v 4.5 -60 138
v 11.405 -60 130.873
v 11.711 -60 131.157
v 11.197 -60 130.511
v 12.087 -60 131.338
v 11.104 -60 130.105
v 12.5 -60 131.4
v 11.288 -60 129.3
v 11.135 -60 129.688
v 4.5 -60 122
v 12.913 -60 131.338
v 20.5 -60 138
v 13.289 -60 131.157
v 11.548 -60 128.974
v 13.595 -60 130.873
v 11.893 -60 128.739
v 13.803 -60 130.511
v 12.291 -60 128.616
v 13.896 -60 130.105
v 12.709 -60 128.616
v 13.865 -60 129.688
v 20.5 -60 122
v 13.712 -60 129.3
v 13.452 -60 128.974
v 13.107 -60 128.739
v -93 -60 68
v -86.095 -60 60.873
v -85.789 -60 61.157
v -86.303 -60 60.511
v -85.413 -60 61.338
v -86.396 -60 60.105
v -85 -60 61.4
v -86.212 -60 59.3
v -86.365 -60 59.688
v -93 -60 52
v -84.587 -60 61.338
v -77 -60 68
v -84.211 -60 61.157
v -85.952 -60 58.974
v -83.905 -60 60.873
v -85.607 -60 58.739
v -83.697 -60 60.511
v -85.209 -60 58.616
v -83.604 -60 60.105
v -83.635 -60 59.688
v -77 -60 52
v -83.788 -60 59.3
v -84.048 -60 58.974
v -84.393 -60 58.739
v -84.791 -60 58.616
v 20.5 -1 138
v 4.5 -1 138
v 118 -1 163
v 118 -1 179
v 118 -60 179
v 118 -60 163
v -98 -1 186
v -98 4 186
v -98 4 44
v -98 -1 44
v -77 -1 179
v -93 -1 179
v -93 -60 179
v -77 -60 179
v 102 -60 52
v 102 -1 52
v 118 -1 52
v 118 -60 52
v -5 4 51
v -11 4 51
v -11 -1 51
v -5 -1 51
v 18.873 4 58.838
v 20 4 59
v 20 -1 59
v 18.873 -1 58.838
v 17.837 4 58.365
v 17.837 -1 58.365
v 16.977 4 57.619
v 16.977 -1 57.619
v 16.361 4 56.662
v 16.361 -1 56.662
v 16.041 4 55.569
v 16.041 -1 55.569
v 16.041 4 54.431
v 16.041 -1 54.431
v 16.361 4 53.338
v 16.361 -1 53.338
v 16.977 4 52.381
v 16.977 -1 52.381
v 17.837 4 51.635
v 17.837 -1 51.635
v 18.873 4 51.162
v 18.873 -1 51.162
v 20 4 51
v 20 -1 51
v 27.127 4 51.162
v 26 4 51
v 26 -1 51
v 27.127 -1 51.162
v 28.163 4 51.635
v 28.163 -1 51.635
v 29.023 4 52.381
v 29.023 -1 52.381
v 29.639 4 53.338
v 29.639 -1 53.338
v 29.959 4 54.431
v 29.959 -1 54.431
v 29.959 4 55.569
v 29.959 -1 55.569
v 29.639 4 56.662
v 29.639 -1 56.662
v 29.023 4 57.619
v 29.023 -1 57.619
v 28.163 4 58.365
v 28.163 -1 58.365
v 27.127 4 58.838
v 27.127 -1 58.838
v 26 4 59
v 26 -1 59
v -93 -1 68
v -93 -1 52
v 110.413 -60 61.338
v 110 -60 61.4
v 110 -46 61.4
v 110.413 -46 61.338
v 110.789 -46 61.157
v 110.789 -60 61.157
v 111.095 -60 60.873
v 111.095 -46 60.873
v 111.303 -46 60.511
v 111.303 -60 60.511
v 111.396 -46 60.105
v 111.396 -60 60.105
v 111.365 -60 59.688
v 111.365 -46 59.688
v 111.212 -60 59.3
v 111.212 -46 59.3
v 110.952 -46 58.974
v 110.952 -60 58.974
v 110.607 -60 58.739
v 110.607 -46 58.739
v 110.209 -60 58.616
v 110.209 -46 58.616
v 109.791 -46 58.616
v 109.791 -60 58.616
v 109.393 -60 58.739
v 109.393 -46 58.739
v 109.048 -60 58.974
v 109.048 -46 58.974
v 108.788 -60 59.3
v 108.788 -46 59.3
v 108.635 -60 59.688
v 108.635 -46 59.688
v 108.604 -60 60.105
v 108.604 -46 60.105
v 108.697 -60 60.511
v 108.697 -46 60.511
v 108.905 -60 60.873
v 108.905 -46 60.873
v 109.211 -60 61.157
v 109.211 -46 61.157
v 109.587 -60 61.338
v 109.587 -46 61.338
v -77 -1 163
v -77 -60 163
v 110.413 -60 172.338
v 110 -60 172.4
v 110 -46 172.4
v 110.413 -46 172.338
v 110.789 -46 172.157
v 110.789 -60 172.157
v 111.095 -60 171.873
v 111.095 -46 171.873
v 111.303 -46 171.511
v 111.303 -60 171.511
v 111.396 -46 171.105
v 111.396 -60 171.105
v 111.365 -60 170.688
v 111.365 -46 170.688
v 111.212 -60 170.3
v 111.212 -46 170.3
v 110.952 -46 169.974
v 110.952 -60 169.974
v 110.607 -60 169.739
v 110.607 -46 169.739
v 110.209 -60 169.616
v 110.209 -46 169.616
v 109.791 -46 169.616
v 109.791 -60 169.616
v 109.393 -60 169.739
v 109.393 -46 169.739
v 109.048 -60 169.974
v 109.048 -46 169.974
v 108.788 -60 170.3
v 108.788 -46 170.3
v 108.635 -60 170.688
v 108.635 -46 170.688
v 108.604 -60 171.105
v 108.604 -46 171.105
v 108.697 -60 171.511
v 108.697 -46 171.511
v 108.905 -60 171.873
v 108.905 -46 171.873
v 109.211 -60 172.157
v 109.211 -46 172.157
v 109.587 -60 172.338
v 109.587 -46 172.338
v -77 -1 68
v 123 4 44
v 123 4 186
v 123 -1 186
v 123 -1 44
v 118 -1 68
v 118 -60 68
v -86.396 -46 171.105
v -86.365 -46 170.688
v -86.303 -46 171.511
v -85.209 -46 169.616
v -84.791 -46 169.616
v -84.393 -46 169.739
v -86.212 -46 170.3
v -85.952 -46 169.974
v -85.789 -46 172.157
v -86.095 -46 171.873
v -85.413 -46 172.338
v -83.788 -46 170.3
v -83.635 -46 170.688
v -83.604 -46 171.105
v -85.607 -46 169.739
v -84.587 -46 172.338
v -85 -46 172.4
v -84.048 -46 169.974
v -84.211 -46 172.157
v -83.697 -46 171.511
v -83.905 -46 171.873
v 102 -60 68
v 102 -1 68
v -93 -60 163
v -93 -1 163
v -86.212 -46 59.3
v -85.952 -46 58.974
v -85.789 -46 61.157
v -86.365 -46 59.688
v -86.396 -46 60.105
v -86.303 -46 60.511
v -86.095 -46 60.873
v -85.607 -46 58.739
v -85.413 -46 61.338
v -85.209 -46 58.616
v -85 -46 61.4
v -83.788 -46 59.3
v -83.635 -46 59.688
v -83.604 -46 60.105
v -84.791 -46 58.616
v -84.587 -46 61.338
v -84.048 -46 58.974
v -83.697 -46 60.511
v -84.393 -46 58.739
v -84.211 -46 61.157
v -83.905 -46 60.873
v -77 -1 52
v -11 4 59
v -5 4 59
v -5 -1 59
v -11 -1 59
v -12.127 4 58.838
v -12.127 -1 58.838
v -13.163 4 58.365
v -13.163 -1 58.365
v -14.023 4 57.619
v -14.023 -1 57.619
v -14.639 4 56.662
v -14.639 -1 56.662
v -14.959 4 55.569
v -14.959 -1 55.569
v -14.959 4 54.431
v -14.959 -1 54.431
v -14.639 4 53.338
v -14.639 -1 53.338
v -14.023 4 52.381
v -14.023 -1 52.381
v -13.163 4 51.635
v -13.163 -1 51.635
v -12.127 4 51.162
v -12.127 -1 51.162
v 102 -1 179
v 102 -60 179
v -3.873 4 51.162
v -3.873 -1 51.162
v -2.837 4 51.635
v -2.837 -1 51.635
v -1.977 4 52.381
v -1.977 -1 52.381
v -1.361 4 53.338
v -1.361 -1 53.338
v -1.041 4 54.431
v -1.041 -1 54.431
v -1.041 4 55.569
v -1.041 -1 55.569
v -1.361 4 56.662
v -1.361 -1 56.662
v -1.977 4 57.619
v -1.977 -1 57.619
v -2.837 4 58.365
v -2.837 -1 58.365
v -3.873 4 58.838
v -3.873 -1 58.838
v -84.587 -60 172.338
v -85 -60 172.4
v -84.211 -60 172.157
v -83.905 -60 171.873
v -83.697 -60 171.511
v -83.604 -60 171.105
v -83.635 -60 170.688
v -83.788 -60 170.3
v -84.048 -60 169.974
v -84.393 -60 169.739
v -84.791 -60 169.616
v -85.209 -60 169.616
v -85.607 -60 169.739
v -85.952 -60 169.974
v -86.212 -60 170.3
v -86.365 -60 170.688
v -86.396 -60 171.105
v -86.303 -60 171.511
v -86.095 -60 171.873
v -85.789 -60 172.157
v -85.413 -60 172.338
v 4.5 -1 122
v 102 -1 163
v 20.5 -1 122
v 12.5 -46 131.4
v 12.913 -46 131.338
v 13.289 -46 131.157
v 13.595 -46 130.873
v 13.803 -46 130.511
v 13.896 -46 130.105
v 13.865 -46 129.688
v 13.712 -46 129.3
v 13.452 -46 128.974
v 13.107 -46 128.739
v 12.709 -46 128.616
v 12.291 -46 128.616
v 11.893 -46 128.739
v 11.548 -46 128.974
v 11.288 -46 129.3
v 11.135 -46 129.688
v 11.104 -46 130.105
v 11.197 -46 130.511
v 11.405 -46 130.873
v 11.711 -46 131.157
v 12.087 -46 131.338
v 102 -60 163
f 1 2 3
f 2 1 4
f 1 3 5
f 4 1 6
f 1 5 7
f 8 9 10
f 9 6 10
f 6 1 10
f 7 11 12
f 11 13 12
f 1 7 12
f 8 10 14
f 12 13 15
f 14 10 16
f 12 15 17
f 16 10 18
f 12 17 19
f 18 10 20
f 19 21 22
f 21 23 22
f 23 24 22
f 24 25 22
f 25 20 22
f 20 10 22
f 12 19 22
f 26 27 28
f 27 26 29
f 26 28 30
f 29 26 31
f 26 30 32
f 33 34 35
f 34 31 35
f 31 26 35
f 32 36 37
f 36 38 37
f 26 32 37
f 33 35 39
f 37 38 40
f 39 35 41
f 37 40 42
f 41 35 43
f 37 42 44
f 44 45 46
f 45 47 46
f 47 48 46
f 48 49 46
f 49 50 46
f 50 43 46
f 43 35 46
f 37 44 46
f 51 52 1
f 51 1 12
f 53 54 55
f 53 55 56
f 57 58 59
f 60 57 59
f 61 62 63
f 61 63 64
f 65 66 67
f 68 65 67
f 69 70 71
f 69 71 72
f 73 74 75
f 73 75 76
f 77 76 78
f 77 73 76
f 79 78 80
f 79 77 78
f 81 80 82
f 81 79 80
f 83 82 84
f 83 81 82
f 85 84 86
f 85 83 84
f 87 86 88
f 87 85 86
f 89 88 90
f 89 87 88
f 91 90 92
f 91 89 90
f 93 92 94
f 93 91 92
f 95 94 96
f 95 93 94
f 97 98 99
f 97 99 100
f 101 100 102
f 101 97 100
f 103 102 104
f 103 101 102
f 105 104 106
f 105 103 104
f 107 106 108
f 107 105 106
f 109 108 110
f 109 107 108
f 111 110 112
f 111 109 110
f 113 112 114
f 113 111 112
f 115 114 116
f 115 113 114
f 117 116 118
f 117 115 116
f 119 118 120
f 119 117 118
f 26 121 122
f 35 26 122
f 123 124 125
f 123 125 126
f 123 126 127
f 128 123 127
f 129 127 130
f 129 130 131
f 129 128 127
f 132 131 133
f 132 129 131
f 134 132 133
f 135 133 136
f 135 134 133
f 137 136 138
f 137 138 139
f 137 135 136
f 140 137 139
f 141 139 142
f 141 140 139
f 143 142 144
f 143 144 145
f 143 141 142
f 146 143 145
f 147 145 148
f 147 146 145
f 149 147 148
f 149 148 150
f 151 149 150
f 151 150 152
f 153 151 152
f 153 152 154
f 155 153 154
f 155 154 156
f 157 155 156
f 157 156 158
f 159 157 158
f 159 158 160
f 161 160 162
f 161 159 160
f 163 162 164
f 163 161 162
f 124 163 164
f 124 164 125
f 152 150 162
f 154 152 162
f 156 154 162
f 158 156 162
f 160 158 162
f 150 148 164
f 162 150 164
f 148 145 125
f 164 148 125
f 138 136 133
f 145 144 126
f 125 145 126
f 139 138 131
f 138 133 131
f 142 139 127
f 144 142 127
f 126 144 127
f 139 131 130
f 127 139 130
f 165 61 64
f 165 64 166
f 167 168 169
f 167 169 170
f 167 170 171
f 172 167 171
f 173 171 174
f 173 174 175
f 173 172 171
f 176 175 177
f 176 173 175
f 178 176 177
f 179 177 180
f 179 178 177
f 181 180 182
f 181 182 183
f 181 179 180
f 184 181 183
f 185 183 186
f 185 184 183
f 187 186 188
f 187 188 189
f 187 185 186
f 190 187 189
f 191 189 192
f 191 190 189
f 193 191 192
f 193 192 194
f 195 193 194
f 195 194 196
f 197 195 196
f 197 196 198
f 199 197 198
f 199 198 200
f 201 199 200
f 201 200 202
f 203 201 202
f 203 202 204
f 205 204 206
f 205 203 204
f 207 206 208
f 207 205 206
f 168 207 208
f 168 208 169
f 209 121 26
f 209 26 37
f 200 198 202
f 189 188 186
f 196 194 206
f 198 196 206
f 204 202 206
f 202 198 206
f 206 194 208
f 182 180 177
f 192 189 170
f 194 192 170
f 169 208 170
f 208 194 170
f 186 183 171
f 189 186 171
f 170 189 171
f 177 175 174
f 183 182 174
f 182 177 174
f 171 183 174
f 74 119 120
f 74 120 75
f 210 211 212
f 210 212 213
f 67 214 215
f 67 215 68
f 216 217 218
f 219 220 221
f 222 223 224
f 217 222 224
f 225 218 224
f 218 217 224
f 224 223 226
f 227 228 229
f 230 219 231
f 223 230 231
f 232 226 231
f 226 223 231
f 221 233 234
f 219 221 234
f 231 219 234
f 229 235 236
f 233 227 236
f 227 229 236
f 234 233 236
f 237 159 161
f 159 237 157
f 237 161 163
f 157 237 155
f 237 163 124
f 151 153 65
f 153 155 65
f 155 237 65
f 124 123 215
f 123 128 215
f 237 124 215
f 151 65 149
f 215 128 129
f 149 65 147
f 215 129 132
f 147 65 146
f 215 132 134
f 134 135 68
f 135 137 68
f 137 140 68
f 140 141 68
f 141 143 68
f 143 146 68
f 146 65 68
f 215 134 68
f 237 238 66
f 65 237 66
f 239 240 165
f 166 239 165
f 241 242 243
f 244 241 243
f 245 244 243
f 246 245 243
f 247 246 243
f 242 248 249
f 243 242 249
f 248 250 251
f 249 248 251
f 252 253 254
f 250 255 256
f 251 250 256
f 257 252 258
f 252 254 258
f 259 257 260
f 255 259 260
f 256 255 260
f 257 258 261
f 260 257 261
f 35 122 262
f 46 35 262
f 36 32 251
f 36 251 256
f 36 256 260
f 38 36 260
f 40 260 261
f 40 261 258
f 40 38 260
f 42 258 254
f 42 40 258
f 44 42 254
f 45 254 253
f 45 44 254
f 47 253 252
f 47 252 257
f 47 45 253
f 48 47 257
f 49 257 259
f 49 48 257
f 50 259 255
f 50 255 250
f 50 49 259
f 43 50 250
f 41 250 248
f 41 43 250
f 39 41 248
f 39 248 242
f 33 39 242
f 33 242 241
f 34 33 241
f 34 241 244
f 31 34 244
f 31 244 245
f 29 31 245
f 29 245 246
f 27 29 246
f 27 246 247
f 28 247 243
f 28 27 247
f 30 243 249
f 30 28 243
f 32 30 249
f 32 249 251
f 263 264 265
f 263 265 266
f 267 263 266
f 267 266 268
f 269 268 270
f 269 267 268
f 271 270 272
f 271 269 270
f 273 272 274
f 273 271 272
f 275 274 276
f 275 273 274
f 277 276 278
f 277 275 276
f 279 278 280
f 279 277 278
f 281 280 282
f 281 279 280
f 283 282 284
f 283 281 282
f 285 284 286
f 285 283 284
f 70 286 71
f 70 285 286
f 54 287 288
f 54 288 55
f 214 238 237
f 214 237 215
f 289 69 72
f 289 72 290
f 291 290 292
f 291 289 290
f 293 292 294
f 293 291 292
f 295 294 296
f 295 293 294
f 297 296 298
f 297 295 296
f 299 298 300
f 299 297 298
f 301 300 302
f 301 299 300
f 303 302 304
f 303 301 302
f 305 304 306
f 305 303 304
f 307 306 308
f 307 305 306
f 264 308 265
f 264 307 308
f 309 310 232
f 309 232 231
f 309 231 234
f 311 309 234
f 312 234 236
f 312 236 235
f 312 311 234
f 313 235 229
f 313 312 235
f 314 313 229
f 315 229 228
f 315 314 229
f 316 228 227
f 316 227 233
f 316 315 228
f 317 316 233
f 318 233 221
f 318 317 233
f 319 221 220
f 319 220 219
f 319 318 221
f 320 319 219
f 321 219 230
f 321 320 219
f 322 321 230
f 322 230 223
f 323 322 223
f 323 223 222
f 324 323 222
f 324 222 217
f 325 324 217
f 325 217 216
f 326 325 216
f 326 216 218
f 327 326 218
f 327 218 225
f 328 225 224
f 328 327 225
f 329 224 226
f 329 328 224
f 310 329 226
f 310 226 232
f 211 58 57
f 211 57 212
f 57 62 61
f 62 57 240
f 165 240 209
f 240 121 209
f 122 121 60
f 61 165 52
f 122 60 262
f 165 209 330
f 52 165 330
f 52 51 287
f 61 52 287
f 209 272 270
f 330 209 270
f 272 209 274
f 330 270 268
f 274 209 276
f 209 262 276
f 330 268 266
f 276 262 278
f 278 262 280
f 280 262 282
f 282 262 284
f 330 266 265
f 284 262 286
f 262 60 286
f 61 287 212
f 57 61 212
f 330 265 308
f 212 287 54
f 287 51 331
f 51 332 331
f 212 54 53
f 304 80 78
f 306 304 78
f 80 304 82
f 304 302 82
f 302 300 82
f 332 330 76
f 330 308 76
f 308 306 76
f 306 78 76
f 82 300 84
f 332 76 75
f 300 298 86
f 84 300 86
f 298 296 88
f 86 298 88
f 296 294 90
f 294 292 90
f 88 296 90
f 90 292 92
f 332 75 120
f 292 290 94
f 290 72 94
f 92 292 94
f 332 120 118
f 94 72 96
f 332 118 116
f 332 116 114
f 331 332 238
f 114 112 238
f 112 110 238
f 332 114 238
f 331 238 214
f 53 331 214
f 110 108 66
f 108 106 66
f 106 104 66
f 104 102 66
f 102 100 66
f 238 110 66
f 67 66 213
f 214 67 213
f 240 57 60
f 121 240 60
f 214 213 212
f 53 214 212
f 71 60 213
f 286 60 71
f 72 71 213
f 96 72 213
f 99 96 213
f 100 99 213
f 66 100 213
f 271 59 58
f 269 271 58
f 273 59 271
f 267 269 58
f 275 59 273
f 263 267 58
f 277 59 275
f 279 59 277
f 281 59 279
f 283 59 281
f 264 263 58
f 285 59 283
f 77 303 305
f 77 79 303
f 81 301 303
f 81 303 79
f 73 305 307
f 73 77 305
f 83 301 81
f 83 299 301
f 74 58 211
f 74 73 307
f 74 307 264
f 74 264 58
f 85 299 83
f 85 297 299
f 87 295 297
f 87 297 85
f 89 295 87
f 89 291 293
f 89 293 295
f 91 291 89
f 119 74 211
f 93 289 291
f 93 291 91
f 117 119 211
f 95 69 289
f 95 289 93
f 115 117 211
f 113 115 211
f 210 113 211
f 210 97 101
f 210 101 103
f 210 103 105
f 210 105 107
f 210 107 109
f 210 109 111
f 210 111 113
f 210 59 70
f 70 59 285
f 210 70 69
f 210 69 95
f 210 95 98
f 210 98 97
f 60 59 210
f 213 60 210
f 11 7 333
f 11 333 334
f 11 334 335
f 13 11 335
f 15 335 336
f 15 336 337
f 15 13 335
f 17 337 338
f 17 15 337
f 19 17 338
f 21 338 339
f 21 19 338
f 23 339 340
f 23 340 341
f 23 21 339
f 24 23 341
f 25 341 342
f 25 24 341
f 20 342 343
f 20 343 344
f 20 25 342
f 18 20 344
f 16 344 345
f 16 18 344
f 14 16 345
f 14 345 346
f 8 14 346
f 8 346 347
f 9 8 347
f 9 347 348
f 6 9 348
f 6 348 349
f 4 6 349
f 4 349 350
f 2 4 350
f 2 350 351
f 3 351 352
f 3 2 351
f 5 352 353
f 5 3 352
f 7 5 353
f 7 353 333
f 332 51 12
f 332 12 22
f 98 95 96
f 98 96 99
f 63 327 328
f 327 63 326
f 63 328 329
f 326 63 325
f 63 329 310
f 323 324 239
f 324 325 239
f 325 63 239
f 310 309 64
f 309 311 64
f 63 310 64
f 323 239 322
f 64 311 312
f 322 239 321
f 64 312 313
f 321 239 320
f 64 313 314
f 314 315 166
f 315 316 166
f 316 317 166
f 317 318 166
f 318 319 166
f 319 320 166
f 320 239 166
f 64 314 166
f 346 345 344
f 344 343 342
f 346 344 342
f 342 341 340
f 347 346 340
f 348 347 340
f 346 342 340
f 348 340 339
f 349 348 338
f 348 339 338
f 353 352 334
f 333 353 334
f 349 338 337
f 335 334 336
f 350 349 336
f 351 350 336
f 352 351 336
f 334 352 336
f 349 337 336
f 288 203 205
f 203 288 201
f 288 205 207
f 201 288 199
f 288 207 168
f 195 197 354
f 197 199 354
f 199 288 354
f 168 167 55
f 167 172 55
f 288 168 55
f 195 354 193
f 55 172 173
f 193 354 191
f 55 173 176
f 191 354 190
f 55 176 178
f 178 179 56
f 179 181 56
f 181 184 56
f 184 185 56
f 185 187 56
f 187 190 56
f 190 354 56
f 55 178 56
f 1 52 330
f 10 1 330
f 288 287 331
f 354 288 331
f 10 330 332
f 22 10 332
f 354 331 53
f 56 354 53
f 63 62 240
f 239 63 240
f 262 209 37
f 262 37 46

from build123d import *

# Parameters (mm, degrees)
V4_UPPER_DECK_221X142_PROFILE_W  = 221
V4_UPPER_DECK_221X142_PROFILE_H  = 142
V4_UPPER_DECK_5MM_DEPTH          = 5
V4_FIVE_SUPPORT_POSTS_PROFILE_W  = 16
V4_FIVE_SUPPORT_POSTS_PROFILE_H  = 16
V4_FIVE_SUPPORT_POSTS_59MM_DEPTH = 59
V4_UPPER_TWO_CABLE_SLOTS_DEPTH   = 5.5
V4_FIVE_M3_PILOTS_PROFILE_R      = 1.4
V4_POST_PILOT_HOLES_DEPTH        = 14


with BuildPart() as part:
    # V4_upper_deck_221x142_profile → V4_upper_deck_5mm (new body)
    with BuildSketch(Plane(origin=(0, 4, 0), x_dir=(1, 0, 0), z_dir=(0, 1, 0))):
        with Locations((12.5, -115)):
            Rectangle(V4_UPPER_DECK_221X142_PROFILE_W, V4_UPPER_DECK_221X142_PROFILE_H)
    extrude(amount=-V4_UPPER_DECK_5MM_DEPTH)

    # V4_five_support_posts_profile → V4_five_support_posts_59mm (add)
    with BuildSketch(Plane(origin=(0, -1, 0), x_dir=(1, 0, 0), z_dir=(0, 1, 0))):
        with Locations((-85, -60)):
            Rectangle(V4_FIVE_SUPPORT_POSTS_PROFILE_W, V4_FIVE_SUPPORT_POSTS_PROFILE_H)
        with Locations((110, -60)):
            Rectangle(V4_FIVE_SUPPORT_POSTS_PROFILE_W, V4_FIVE_SUPPORT_POSTS_PROFILE_H)
        with Locations((-85, -171)):
            Rectangle(V4_FIVE_SUPPORT_POSTS_PROFILE_W, V4_FIVE_SUPPORT_POSTS_PROFILE_H)
        with Locations((110, -171)):
            Rectangle(V4_FIVE_SUPPORT_POSTS_PROFILE_W, V4_FIVE_SUPPORT_POSTS_PROFILE_H)
        with Locations((12.5, -130)):
            Rectangle(V4_FIVE_SUPPORT_POSTS_PROFILE_W, V4_FIVE_SUPPORT_POSTS_PROFILE_H)
    extrude(amount=-V4_FIVE_SUPPORT_POSTS_59MM_DEPTH)

    # V4_upper_two_cable_slots_profile → V4_upper_two_cable_slots (cut)
    with BuildSketch(Plane(origin=(0, 4, 0), x_dir=(1, 0, 0), z_dir=(0, 1, 0))):
        with BuildLine():
            Line((-11, -51), (-5, -51))
            ThreePointArc((-5, -51), (-1, -55), (-5, -59))
            Line((-5, -59), (-11, -59))
            ThreePointArc((-11, -59), (-15, -55), (-11, -51))
        make_face()
        with BuildLine():
            Line((20, -51), (26, -51))
            ThreePointArc((26, -51), (30, -55), (26, -59))
            Line((26, -59), (20, -59))
            ThreePointArc((20, -59), (16, -55), (20, -51))
        make_face()
    extrude(amount=-V4_UPPER_TWO_CABLE_SLOTS_DEPTH, mode=Mode.SUBTRACT)

    # V4_five_M3_pilots_profile → V4_post_pilot_holes (cut)
    with BuildSketch(Plane(origin=(0, -60, 0), x_dir=(1, 0, 0), z_dir=(0, 1, 0))):
        with Locations(Location((-85, -60, 0), (0, 0, 270))):
            Circle(V4_FIVE_M3_PILOTS_PROFILE_R)
        with Locations(Location((110, -60, 0), (0, 0, 270))):
            Circle(V4_FIVE_M3_PILOTS_PROFILE_R)
        with Locations(Location((-85, -171, 0), (0, 0, 270))):
            Circle(V4_FIVE_M3_PILOTS_PROFILE_R)
        with Locations(Location((110, -171, 0), (0, 0, 270))):
            Circle(V4_FIVE_M3_PILOTS_PROFILE_R)
        with Locations(Location((12.5, -130, 0), (0, 0, 270))):
            Circle(V4_FIVE_M3_PILOTS_PROFILE_R)
    extrude(amount=V4_POST_PILOT_HOLES_DEPTH, mode=Mode.SUBTRACT)


solid = part.part
